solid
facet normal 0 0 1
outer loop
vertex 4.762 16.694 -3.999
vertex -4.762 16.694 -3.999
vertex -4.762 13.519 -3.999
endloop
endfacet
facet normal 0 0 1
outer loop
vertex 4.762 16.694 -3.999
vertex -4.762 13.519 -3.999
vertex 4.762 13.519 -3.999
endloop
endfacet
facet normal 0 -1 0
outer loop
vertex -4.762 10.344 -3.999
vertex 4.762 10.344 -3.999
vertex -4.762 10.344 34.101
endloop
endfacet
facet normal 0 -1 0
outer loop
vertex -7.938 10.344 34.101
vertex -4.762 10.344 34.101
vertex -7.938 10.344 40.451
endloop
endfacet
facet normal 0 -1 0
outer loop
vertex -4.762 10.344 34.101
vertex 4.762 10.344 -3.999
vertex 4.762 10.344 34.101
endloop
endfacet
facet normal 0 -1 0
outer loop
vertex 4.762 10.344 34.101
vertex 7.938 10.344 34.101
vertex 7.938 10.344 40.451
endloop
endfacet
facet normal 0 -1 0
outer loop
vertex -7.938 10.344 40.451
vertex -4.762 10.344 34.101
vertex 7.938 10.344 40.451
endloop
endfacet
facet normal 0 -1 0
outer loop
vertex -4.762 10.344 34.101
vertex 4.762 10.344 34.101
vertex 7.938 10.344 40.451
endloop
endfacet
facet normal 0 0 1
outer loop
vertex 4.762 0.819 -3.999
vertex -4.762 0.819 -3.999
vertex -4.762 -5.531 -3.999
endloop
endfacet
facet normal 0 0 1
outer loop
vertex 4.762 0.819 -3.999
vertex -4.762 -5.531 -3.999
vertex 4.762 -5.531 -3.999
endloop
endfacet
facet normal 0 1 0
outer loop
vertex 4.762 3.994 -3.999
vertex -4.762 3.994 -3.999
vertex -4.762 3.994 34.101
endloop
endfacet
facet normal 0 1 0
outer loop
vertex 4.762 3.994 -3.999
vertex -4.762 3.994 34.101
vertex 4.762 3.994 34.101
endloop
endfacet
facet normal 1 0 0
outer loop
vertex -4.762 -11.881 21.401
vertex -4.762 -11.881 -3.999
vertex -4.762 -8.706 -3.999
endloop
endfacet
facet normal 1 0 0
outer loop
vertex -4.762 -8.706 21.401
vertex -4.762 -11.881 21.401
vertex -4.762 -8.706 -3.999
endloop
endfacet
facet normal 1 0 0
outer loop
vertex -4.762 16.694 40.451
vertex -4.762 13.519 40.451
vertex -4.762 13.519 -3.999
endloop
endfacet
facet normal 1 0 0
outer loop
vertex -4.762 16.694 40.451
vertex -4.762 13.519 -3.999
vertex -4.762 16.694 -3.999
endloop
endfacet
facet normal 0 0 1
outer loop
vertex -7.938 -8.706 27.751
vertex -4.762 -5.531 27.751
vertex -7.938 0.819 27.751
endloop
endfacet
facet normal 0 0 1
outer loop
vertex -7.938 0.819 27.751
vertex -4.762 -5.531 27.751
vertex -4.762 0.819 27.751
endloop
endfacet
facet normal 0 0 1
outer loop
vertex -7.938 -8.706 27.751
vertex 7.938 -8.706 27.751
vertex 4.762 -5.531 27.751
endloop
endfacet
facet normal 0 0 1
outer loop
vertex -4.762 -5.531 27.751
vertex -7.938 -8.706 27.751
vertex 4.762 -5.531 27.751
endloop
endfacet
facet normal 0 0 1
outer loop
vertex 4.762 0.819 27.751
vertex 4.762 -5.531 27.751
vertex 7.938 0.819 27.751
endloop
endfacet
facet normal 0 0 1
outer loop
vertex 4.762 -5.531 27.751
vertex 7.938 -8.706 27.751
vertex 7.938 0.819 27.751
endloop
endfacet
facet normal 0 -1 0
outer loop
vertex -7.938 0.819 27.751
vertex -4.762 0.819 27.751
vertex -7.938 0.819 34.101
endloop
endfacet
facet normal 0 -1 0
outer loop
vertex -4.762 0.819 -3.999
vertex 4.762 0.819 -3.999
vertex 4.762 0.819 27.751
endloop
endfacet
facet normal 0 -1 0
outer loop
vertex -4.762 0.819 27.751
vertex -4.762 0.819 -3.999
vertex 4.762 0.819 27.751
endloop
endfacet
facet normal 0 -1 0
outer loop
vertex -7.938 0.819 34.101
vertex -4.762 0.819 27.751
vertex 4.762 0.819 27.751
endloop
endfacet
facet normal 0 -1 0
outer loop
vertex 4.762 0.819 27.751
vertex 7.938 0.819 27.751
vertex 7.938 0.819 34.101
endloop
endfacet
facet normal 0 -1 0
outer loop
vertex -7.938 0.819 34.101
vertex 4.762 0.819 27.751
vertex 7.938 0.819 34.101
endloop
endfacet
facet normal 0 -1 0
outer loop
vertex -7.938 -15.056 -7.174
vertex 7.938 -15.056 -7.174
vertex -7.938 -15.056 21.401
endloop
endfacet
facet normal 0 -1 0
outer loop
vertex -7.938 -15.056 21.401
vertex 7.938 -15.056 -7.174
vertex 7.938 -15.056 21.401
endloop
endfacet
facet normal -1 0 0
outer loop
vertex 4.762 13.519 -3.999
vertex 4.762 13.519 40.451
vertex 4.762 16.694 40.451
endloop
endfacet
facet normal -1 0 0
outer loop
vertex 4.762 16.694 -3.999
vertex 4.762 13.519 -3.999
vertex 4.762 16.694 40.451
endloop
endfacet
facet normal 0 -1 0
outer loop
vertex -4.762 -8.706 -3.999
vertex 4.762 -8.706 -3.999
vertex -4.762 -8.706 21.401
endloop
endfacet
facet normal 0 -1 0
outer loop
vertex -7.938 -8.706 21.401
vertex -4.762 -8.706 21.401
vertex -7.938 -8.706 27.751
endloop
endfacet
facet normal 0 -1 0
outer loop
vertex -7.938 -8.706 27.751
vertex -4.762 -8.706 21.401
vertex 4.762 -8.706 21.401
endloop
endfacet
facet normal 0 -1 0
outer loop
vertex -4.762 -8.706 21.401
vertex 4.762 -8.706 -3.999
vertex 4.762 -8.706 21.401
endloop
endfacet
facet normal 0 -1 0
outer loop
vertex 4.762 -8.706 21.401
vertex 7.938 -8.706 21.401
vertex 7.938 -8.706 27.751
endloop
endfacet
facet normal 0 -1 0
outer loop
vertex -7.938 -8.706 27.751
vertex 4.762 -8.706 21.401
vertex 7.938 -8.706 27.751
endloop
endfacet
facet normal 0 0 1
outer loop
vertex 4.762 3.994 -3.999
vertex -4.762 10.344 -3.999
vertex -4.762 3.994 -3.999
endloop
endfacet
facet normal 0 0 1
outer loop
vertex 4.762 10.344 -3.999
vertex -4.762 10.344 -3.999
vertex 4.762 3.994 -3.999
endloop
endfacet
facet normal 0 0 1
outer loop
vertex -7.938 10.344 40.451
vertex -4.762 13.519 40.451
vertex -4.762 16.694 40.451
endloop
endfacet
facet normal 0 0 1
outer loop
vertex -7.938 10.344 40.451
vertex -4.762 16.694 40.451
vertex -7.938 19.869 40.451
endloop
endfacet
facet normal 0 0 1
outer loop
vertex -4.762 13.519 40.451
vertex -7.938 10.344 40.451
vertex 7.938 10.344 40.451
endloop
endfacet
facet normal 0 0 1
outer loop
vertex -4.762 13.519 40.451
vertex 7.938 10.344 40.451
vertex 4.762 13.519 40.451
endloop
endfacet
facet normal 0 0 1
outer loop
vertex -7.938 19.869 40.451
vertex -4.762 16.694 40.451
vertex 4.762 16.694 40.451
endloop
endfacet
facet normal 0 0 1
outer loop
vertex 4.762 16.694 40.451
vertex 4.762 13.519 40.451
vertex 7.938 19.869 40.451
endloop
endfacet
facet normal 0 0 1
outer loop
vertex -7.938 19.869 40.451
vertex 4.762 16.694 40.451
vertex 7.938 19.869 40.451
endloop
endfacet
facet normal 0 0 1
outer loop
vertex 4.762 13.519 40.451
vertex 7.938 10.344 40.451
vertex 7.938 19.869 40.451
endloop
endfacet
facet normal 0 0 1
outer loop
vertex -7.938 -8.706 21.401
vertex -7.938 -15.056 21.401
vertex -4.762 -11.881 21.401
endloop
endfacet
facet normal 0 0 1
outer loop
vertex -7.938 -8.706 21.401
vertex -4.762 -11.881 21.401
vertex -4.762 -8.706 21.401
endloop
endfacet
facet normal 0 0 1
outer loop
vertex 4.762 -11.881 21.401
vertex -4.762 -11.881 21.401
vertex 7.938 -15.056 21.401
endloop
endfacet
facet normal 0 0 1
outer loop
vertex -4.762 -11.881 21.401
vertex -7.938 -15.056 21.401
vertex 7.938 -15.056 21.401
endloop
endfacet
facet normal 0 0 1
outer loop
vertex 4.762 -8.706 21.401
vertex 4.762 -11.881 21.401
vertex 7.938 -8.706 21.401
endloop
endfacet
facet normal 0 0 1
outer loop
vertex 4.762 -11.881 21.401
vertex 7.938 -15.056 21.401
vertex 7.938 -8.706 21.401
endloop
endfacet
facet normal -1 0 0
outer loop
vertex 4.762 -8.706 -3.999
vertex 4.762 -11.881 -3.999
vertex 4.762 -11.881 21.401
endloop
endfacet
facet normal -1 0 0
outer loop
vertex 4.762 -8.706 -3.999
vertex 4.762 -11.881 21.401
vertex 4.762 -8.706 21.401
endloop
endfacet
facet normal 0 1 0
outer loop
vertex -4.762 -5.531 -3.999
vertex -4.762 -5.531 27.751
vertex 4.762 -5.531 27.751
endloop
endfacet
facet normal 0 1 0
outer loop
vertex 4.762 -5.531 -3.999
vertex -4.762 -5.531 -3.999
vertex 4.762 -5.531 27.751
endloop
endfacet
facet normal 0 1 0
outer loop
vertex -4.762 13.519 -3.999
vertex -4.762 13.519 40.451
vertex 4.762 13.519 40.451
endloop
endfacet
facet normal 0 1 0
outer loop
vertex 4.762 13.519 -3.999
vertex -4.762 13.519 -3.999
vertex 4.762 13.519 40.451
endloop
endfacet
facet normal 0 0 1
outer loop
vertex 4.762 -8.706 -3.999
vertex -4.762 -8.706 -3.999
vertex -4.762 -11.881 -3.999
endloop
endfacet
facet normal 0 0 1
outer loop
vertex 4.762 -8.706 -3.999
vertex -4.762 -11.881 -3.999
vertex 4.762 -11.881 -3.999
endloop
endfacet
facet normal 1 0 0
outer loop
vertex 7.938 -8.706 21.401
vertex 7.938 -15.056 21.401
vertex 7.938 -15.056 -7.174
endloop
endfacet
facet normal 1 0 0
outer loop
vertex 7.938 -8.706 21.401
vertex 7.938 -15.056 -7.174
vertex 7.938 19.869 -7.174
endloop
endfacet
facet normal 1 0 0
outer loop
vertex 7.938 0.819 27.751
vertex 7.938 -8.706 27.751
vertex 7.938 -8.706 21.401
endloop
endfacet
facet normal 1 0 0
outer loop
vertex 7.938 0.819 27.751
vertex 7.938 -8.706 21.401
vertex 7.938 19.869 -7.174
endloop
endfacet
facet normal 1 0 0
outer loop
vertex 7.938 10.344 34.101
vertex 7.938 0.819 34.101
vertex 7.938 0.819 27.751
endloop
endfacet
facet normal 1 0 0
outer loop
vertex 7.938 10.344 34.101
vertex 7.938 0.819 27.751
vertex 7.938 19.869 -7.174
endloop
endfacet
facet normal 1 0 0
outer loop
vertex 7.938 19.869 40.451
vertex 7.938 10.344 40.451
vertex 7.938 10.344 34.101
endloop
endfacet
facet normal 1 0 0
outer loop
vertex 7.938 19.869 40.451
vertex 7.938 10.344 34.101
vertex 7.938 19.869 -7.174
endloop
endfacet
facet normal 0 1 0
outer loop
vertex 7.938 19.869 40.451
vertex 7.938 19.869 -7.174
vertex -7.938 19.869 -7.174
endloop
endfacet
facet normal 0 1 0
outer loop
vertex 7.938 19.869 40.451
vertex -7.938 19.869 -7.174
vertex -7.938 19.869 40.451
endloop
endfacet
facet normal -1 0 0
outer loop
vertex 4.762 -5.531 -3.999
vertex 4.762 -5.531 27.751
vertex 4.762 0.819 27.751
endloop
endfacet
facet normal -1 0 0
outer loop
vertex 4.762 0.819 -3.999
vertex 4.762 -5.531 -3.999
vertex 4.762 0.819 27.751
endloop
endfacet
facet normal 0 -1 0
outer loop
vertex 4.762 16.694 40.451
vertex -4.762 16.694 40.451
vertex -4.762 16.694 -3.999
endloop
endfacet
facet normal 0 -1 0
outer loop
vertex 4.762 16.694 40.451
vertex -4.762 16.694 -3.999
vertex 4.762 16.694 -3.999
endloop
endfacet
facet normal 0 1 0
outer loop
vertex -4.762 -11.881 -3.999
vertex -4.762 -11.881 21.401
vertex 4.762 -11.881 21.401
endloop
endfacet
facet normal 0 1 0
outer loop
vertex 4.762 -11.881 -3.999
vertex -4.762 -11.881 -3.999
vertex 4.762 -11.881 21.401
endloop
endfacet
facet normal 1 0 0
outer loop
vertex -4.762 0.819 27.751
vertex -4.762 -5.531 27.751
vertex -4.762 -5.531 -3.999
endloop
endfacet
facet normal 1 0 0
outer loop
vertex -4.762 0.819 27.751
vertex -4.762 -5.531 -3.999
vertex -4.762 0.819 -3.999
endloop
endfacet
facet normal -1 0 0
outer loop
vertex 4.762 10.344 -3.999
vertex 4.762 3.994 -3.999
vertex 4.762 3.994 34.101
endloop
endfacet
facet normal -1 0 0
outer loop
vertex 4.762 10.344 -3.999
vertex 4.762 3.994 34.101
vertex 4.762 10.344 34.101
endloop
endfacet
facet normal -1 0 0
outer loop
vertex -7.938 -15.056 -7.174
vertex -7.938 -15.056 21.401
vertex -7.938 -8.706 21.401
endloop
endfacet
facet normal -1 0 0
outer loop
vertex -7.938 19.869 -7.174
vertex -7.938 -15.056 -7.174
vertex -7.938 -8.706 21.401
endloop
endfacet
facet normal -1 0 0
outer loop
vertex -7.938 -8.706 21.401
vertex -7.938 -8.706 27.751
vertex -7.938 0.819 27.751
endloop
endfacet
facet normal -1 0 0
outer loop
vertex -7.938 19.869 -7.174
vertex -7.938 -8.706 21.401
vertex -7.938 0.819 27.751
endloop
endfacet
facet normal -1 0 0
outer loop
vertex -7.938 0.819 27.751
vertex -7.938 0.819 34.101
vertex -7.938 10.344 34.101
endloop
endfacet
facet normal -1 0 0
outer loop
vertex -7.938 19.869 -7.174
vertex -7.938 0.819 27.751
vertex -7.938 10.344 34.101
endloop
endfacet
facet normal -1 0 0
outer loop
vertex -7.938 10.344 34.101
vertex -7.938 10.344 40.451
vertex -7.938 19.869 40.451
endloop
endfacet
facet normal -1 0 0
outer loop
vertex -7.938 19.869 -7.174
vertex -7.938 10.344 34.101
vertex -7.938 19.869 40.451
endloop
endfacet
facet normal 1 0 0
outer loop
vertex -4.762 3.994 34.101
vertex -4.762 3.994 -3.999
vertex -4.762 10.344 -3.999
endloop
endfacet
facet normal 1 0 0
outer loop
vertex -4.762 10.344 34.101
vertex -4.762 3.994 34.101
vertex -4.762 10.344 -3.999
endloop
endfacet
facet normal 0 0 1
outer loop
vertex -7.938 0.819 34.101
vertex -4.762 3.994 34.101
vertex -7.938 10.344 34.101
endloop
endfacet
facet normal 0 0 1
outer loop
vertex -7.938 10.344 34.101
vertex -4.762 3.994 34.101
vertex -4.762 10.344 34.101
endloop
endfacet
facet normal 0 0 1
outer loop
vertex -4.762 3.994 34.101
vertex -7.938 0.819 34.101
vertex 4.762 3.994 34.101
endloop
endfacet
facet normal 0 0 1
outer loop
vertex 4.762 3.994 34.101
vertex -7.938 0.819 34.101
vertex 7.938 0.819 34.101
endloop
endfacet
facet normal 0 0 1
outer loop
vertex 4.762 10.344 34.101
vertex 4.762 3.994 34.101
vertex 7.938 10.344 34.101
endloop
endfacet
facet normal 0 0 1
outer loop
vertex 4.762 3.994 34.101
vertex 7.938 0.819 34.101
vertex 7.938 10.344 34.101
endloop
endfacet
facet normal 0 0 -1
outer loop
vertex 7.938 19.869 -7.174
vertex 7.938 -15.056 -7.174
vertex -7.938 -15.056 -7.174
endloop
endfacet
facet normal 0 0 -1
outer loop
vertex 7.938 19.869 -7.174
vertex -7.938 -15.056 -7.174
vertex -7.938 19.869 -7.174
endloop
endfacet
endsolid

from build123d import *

# Parameters (mm, degrees)
F0_W      = 34.925
F0_H      = 47.625
F1_DEPTH  = 7.9375
F3_DEPTH  = 12.7
F4_W      = 9.525
F4_H      = 3.175
F5_DEPTH  = 44.45
F6_W      = 9.525
F6_H      = 6.35
F7_DEPTH  = 38.1
F8_W      = 9.525
F8_H      = 6.35
F9_DEPTH  = 31.75
F10_W     = 9.525
F10_H     = 3.175
F11_DEPTH = 25.4


with BuildPart() as f1:
    # F0 (on Right) → F1 (new body, symmetric)
    with BuildSketch(Plane.YZ):
        with Locations((2.406316, 16.638194)):
            Rectangle(F0_W, F0_H)
    extrude(amount=F1_DEPTH, both=True)

    # F2 (on Right) → F3 (cut, symmetric)
    with BuildSketch(Plane.YZ):
        Polygon((-15.056184, 46.800694), (-15.056184, 21.400694), (-8.706184, 21.400694), (-8.706184, 27.750694), (0.818816, 27.750694), (0.818816, 34.100694), (10.343816, 34.100694), (10.343816, 40.450694), (19.868816, 40.450694), (19.868816, 46.800694), align=None)
    extrude(amount=F3_DEPTH, both=True, mode=Mode.SUBTRACT)

    # F4 (on face) → F5 (cut)
    with BuildSketch(Plane.XY.offset(40.450694)):
        with Locations((0, 15.106316)):
            Rectangle(F4_W, F4_H)
    extrude(amount=-F5_DEPTH, mode=Mode.SUBTRACT)

    # F6 (on face) → F7 (cut)
    with BuildSketch(Plane.XY.offset(34.100694)):
        with Locations((0, 7.168816)):
            Rectangle(F6_W, F6_H)
    extrude(amount=-F7_DEPTH, mode=Mode.SUBTRACT)

    # F8 (on face) → F9 (cut)
    with BuildSketch(Plane.XY.offset(27.750694)):
        with Locations((0, -2.356184)):
            Rectangle(F8_W, F8_H)
    extrude(amount=-F9_DEPTH, mode=Mode.SUBTRACT)

    # F10 (on face) → F11 (cut)
    with BuildSketch(Plane.XY.offset(21.400694)):
        with Locations((0, -10.293684)):
            Rectangle(F10_W, F10_H)
    extrude(amount=-F11_DEPTH, mode=Mode.SUBTRACT)


solid = f1.part
